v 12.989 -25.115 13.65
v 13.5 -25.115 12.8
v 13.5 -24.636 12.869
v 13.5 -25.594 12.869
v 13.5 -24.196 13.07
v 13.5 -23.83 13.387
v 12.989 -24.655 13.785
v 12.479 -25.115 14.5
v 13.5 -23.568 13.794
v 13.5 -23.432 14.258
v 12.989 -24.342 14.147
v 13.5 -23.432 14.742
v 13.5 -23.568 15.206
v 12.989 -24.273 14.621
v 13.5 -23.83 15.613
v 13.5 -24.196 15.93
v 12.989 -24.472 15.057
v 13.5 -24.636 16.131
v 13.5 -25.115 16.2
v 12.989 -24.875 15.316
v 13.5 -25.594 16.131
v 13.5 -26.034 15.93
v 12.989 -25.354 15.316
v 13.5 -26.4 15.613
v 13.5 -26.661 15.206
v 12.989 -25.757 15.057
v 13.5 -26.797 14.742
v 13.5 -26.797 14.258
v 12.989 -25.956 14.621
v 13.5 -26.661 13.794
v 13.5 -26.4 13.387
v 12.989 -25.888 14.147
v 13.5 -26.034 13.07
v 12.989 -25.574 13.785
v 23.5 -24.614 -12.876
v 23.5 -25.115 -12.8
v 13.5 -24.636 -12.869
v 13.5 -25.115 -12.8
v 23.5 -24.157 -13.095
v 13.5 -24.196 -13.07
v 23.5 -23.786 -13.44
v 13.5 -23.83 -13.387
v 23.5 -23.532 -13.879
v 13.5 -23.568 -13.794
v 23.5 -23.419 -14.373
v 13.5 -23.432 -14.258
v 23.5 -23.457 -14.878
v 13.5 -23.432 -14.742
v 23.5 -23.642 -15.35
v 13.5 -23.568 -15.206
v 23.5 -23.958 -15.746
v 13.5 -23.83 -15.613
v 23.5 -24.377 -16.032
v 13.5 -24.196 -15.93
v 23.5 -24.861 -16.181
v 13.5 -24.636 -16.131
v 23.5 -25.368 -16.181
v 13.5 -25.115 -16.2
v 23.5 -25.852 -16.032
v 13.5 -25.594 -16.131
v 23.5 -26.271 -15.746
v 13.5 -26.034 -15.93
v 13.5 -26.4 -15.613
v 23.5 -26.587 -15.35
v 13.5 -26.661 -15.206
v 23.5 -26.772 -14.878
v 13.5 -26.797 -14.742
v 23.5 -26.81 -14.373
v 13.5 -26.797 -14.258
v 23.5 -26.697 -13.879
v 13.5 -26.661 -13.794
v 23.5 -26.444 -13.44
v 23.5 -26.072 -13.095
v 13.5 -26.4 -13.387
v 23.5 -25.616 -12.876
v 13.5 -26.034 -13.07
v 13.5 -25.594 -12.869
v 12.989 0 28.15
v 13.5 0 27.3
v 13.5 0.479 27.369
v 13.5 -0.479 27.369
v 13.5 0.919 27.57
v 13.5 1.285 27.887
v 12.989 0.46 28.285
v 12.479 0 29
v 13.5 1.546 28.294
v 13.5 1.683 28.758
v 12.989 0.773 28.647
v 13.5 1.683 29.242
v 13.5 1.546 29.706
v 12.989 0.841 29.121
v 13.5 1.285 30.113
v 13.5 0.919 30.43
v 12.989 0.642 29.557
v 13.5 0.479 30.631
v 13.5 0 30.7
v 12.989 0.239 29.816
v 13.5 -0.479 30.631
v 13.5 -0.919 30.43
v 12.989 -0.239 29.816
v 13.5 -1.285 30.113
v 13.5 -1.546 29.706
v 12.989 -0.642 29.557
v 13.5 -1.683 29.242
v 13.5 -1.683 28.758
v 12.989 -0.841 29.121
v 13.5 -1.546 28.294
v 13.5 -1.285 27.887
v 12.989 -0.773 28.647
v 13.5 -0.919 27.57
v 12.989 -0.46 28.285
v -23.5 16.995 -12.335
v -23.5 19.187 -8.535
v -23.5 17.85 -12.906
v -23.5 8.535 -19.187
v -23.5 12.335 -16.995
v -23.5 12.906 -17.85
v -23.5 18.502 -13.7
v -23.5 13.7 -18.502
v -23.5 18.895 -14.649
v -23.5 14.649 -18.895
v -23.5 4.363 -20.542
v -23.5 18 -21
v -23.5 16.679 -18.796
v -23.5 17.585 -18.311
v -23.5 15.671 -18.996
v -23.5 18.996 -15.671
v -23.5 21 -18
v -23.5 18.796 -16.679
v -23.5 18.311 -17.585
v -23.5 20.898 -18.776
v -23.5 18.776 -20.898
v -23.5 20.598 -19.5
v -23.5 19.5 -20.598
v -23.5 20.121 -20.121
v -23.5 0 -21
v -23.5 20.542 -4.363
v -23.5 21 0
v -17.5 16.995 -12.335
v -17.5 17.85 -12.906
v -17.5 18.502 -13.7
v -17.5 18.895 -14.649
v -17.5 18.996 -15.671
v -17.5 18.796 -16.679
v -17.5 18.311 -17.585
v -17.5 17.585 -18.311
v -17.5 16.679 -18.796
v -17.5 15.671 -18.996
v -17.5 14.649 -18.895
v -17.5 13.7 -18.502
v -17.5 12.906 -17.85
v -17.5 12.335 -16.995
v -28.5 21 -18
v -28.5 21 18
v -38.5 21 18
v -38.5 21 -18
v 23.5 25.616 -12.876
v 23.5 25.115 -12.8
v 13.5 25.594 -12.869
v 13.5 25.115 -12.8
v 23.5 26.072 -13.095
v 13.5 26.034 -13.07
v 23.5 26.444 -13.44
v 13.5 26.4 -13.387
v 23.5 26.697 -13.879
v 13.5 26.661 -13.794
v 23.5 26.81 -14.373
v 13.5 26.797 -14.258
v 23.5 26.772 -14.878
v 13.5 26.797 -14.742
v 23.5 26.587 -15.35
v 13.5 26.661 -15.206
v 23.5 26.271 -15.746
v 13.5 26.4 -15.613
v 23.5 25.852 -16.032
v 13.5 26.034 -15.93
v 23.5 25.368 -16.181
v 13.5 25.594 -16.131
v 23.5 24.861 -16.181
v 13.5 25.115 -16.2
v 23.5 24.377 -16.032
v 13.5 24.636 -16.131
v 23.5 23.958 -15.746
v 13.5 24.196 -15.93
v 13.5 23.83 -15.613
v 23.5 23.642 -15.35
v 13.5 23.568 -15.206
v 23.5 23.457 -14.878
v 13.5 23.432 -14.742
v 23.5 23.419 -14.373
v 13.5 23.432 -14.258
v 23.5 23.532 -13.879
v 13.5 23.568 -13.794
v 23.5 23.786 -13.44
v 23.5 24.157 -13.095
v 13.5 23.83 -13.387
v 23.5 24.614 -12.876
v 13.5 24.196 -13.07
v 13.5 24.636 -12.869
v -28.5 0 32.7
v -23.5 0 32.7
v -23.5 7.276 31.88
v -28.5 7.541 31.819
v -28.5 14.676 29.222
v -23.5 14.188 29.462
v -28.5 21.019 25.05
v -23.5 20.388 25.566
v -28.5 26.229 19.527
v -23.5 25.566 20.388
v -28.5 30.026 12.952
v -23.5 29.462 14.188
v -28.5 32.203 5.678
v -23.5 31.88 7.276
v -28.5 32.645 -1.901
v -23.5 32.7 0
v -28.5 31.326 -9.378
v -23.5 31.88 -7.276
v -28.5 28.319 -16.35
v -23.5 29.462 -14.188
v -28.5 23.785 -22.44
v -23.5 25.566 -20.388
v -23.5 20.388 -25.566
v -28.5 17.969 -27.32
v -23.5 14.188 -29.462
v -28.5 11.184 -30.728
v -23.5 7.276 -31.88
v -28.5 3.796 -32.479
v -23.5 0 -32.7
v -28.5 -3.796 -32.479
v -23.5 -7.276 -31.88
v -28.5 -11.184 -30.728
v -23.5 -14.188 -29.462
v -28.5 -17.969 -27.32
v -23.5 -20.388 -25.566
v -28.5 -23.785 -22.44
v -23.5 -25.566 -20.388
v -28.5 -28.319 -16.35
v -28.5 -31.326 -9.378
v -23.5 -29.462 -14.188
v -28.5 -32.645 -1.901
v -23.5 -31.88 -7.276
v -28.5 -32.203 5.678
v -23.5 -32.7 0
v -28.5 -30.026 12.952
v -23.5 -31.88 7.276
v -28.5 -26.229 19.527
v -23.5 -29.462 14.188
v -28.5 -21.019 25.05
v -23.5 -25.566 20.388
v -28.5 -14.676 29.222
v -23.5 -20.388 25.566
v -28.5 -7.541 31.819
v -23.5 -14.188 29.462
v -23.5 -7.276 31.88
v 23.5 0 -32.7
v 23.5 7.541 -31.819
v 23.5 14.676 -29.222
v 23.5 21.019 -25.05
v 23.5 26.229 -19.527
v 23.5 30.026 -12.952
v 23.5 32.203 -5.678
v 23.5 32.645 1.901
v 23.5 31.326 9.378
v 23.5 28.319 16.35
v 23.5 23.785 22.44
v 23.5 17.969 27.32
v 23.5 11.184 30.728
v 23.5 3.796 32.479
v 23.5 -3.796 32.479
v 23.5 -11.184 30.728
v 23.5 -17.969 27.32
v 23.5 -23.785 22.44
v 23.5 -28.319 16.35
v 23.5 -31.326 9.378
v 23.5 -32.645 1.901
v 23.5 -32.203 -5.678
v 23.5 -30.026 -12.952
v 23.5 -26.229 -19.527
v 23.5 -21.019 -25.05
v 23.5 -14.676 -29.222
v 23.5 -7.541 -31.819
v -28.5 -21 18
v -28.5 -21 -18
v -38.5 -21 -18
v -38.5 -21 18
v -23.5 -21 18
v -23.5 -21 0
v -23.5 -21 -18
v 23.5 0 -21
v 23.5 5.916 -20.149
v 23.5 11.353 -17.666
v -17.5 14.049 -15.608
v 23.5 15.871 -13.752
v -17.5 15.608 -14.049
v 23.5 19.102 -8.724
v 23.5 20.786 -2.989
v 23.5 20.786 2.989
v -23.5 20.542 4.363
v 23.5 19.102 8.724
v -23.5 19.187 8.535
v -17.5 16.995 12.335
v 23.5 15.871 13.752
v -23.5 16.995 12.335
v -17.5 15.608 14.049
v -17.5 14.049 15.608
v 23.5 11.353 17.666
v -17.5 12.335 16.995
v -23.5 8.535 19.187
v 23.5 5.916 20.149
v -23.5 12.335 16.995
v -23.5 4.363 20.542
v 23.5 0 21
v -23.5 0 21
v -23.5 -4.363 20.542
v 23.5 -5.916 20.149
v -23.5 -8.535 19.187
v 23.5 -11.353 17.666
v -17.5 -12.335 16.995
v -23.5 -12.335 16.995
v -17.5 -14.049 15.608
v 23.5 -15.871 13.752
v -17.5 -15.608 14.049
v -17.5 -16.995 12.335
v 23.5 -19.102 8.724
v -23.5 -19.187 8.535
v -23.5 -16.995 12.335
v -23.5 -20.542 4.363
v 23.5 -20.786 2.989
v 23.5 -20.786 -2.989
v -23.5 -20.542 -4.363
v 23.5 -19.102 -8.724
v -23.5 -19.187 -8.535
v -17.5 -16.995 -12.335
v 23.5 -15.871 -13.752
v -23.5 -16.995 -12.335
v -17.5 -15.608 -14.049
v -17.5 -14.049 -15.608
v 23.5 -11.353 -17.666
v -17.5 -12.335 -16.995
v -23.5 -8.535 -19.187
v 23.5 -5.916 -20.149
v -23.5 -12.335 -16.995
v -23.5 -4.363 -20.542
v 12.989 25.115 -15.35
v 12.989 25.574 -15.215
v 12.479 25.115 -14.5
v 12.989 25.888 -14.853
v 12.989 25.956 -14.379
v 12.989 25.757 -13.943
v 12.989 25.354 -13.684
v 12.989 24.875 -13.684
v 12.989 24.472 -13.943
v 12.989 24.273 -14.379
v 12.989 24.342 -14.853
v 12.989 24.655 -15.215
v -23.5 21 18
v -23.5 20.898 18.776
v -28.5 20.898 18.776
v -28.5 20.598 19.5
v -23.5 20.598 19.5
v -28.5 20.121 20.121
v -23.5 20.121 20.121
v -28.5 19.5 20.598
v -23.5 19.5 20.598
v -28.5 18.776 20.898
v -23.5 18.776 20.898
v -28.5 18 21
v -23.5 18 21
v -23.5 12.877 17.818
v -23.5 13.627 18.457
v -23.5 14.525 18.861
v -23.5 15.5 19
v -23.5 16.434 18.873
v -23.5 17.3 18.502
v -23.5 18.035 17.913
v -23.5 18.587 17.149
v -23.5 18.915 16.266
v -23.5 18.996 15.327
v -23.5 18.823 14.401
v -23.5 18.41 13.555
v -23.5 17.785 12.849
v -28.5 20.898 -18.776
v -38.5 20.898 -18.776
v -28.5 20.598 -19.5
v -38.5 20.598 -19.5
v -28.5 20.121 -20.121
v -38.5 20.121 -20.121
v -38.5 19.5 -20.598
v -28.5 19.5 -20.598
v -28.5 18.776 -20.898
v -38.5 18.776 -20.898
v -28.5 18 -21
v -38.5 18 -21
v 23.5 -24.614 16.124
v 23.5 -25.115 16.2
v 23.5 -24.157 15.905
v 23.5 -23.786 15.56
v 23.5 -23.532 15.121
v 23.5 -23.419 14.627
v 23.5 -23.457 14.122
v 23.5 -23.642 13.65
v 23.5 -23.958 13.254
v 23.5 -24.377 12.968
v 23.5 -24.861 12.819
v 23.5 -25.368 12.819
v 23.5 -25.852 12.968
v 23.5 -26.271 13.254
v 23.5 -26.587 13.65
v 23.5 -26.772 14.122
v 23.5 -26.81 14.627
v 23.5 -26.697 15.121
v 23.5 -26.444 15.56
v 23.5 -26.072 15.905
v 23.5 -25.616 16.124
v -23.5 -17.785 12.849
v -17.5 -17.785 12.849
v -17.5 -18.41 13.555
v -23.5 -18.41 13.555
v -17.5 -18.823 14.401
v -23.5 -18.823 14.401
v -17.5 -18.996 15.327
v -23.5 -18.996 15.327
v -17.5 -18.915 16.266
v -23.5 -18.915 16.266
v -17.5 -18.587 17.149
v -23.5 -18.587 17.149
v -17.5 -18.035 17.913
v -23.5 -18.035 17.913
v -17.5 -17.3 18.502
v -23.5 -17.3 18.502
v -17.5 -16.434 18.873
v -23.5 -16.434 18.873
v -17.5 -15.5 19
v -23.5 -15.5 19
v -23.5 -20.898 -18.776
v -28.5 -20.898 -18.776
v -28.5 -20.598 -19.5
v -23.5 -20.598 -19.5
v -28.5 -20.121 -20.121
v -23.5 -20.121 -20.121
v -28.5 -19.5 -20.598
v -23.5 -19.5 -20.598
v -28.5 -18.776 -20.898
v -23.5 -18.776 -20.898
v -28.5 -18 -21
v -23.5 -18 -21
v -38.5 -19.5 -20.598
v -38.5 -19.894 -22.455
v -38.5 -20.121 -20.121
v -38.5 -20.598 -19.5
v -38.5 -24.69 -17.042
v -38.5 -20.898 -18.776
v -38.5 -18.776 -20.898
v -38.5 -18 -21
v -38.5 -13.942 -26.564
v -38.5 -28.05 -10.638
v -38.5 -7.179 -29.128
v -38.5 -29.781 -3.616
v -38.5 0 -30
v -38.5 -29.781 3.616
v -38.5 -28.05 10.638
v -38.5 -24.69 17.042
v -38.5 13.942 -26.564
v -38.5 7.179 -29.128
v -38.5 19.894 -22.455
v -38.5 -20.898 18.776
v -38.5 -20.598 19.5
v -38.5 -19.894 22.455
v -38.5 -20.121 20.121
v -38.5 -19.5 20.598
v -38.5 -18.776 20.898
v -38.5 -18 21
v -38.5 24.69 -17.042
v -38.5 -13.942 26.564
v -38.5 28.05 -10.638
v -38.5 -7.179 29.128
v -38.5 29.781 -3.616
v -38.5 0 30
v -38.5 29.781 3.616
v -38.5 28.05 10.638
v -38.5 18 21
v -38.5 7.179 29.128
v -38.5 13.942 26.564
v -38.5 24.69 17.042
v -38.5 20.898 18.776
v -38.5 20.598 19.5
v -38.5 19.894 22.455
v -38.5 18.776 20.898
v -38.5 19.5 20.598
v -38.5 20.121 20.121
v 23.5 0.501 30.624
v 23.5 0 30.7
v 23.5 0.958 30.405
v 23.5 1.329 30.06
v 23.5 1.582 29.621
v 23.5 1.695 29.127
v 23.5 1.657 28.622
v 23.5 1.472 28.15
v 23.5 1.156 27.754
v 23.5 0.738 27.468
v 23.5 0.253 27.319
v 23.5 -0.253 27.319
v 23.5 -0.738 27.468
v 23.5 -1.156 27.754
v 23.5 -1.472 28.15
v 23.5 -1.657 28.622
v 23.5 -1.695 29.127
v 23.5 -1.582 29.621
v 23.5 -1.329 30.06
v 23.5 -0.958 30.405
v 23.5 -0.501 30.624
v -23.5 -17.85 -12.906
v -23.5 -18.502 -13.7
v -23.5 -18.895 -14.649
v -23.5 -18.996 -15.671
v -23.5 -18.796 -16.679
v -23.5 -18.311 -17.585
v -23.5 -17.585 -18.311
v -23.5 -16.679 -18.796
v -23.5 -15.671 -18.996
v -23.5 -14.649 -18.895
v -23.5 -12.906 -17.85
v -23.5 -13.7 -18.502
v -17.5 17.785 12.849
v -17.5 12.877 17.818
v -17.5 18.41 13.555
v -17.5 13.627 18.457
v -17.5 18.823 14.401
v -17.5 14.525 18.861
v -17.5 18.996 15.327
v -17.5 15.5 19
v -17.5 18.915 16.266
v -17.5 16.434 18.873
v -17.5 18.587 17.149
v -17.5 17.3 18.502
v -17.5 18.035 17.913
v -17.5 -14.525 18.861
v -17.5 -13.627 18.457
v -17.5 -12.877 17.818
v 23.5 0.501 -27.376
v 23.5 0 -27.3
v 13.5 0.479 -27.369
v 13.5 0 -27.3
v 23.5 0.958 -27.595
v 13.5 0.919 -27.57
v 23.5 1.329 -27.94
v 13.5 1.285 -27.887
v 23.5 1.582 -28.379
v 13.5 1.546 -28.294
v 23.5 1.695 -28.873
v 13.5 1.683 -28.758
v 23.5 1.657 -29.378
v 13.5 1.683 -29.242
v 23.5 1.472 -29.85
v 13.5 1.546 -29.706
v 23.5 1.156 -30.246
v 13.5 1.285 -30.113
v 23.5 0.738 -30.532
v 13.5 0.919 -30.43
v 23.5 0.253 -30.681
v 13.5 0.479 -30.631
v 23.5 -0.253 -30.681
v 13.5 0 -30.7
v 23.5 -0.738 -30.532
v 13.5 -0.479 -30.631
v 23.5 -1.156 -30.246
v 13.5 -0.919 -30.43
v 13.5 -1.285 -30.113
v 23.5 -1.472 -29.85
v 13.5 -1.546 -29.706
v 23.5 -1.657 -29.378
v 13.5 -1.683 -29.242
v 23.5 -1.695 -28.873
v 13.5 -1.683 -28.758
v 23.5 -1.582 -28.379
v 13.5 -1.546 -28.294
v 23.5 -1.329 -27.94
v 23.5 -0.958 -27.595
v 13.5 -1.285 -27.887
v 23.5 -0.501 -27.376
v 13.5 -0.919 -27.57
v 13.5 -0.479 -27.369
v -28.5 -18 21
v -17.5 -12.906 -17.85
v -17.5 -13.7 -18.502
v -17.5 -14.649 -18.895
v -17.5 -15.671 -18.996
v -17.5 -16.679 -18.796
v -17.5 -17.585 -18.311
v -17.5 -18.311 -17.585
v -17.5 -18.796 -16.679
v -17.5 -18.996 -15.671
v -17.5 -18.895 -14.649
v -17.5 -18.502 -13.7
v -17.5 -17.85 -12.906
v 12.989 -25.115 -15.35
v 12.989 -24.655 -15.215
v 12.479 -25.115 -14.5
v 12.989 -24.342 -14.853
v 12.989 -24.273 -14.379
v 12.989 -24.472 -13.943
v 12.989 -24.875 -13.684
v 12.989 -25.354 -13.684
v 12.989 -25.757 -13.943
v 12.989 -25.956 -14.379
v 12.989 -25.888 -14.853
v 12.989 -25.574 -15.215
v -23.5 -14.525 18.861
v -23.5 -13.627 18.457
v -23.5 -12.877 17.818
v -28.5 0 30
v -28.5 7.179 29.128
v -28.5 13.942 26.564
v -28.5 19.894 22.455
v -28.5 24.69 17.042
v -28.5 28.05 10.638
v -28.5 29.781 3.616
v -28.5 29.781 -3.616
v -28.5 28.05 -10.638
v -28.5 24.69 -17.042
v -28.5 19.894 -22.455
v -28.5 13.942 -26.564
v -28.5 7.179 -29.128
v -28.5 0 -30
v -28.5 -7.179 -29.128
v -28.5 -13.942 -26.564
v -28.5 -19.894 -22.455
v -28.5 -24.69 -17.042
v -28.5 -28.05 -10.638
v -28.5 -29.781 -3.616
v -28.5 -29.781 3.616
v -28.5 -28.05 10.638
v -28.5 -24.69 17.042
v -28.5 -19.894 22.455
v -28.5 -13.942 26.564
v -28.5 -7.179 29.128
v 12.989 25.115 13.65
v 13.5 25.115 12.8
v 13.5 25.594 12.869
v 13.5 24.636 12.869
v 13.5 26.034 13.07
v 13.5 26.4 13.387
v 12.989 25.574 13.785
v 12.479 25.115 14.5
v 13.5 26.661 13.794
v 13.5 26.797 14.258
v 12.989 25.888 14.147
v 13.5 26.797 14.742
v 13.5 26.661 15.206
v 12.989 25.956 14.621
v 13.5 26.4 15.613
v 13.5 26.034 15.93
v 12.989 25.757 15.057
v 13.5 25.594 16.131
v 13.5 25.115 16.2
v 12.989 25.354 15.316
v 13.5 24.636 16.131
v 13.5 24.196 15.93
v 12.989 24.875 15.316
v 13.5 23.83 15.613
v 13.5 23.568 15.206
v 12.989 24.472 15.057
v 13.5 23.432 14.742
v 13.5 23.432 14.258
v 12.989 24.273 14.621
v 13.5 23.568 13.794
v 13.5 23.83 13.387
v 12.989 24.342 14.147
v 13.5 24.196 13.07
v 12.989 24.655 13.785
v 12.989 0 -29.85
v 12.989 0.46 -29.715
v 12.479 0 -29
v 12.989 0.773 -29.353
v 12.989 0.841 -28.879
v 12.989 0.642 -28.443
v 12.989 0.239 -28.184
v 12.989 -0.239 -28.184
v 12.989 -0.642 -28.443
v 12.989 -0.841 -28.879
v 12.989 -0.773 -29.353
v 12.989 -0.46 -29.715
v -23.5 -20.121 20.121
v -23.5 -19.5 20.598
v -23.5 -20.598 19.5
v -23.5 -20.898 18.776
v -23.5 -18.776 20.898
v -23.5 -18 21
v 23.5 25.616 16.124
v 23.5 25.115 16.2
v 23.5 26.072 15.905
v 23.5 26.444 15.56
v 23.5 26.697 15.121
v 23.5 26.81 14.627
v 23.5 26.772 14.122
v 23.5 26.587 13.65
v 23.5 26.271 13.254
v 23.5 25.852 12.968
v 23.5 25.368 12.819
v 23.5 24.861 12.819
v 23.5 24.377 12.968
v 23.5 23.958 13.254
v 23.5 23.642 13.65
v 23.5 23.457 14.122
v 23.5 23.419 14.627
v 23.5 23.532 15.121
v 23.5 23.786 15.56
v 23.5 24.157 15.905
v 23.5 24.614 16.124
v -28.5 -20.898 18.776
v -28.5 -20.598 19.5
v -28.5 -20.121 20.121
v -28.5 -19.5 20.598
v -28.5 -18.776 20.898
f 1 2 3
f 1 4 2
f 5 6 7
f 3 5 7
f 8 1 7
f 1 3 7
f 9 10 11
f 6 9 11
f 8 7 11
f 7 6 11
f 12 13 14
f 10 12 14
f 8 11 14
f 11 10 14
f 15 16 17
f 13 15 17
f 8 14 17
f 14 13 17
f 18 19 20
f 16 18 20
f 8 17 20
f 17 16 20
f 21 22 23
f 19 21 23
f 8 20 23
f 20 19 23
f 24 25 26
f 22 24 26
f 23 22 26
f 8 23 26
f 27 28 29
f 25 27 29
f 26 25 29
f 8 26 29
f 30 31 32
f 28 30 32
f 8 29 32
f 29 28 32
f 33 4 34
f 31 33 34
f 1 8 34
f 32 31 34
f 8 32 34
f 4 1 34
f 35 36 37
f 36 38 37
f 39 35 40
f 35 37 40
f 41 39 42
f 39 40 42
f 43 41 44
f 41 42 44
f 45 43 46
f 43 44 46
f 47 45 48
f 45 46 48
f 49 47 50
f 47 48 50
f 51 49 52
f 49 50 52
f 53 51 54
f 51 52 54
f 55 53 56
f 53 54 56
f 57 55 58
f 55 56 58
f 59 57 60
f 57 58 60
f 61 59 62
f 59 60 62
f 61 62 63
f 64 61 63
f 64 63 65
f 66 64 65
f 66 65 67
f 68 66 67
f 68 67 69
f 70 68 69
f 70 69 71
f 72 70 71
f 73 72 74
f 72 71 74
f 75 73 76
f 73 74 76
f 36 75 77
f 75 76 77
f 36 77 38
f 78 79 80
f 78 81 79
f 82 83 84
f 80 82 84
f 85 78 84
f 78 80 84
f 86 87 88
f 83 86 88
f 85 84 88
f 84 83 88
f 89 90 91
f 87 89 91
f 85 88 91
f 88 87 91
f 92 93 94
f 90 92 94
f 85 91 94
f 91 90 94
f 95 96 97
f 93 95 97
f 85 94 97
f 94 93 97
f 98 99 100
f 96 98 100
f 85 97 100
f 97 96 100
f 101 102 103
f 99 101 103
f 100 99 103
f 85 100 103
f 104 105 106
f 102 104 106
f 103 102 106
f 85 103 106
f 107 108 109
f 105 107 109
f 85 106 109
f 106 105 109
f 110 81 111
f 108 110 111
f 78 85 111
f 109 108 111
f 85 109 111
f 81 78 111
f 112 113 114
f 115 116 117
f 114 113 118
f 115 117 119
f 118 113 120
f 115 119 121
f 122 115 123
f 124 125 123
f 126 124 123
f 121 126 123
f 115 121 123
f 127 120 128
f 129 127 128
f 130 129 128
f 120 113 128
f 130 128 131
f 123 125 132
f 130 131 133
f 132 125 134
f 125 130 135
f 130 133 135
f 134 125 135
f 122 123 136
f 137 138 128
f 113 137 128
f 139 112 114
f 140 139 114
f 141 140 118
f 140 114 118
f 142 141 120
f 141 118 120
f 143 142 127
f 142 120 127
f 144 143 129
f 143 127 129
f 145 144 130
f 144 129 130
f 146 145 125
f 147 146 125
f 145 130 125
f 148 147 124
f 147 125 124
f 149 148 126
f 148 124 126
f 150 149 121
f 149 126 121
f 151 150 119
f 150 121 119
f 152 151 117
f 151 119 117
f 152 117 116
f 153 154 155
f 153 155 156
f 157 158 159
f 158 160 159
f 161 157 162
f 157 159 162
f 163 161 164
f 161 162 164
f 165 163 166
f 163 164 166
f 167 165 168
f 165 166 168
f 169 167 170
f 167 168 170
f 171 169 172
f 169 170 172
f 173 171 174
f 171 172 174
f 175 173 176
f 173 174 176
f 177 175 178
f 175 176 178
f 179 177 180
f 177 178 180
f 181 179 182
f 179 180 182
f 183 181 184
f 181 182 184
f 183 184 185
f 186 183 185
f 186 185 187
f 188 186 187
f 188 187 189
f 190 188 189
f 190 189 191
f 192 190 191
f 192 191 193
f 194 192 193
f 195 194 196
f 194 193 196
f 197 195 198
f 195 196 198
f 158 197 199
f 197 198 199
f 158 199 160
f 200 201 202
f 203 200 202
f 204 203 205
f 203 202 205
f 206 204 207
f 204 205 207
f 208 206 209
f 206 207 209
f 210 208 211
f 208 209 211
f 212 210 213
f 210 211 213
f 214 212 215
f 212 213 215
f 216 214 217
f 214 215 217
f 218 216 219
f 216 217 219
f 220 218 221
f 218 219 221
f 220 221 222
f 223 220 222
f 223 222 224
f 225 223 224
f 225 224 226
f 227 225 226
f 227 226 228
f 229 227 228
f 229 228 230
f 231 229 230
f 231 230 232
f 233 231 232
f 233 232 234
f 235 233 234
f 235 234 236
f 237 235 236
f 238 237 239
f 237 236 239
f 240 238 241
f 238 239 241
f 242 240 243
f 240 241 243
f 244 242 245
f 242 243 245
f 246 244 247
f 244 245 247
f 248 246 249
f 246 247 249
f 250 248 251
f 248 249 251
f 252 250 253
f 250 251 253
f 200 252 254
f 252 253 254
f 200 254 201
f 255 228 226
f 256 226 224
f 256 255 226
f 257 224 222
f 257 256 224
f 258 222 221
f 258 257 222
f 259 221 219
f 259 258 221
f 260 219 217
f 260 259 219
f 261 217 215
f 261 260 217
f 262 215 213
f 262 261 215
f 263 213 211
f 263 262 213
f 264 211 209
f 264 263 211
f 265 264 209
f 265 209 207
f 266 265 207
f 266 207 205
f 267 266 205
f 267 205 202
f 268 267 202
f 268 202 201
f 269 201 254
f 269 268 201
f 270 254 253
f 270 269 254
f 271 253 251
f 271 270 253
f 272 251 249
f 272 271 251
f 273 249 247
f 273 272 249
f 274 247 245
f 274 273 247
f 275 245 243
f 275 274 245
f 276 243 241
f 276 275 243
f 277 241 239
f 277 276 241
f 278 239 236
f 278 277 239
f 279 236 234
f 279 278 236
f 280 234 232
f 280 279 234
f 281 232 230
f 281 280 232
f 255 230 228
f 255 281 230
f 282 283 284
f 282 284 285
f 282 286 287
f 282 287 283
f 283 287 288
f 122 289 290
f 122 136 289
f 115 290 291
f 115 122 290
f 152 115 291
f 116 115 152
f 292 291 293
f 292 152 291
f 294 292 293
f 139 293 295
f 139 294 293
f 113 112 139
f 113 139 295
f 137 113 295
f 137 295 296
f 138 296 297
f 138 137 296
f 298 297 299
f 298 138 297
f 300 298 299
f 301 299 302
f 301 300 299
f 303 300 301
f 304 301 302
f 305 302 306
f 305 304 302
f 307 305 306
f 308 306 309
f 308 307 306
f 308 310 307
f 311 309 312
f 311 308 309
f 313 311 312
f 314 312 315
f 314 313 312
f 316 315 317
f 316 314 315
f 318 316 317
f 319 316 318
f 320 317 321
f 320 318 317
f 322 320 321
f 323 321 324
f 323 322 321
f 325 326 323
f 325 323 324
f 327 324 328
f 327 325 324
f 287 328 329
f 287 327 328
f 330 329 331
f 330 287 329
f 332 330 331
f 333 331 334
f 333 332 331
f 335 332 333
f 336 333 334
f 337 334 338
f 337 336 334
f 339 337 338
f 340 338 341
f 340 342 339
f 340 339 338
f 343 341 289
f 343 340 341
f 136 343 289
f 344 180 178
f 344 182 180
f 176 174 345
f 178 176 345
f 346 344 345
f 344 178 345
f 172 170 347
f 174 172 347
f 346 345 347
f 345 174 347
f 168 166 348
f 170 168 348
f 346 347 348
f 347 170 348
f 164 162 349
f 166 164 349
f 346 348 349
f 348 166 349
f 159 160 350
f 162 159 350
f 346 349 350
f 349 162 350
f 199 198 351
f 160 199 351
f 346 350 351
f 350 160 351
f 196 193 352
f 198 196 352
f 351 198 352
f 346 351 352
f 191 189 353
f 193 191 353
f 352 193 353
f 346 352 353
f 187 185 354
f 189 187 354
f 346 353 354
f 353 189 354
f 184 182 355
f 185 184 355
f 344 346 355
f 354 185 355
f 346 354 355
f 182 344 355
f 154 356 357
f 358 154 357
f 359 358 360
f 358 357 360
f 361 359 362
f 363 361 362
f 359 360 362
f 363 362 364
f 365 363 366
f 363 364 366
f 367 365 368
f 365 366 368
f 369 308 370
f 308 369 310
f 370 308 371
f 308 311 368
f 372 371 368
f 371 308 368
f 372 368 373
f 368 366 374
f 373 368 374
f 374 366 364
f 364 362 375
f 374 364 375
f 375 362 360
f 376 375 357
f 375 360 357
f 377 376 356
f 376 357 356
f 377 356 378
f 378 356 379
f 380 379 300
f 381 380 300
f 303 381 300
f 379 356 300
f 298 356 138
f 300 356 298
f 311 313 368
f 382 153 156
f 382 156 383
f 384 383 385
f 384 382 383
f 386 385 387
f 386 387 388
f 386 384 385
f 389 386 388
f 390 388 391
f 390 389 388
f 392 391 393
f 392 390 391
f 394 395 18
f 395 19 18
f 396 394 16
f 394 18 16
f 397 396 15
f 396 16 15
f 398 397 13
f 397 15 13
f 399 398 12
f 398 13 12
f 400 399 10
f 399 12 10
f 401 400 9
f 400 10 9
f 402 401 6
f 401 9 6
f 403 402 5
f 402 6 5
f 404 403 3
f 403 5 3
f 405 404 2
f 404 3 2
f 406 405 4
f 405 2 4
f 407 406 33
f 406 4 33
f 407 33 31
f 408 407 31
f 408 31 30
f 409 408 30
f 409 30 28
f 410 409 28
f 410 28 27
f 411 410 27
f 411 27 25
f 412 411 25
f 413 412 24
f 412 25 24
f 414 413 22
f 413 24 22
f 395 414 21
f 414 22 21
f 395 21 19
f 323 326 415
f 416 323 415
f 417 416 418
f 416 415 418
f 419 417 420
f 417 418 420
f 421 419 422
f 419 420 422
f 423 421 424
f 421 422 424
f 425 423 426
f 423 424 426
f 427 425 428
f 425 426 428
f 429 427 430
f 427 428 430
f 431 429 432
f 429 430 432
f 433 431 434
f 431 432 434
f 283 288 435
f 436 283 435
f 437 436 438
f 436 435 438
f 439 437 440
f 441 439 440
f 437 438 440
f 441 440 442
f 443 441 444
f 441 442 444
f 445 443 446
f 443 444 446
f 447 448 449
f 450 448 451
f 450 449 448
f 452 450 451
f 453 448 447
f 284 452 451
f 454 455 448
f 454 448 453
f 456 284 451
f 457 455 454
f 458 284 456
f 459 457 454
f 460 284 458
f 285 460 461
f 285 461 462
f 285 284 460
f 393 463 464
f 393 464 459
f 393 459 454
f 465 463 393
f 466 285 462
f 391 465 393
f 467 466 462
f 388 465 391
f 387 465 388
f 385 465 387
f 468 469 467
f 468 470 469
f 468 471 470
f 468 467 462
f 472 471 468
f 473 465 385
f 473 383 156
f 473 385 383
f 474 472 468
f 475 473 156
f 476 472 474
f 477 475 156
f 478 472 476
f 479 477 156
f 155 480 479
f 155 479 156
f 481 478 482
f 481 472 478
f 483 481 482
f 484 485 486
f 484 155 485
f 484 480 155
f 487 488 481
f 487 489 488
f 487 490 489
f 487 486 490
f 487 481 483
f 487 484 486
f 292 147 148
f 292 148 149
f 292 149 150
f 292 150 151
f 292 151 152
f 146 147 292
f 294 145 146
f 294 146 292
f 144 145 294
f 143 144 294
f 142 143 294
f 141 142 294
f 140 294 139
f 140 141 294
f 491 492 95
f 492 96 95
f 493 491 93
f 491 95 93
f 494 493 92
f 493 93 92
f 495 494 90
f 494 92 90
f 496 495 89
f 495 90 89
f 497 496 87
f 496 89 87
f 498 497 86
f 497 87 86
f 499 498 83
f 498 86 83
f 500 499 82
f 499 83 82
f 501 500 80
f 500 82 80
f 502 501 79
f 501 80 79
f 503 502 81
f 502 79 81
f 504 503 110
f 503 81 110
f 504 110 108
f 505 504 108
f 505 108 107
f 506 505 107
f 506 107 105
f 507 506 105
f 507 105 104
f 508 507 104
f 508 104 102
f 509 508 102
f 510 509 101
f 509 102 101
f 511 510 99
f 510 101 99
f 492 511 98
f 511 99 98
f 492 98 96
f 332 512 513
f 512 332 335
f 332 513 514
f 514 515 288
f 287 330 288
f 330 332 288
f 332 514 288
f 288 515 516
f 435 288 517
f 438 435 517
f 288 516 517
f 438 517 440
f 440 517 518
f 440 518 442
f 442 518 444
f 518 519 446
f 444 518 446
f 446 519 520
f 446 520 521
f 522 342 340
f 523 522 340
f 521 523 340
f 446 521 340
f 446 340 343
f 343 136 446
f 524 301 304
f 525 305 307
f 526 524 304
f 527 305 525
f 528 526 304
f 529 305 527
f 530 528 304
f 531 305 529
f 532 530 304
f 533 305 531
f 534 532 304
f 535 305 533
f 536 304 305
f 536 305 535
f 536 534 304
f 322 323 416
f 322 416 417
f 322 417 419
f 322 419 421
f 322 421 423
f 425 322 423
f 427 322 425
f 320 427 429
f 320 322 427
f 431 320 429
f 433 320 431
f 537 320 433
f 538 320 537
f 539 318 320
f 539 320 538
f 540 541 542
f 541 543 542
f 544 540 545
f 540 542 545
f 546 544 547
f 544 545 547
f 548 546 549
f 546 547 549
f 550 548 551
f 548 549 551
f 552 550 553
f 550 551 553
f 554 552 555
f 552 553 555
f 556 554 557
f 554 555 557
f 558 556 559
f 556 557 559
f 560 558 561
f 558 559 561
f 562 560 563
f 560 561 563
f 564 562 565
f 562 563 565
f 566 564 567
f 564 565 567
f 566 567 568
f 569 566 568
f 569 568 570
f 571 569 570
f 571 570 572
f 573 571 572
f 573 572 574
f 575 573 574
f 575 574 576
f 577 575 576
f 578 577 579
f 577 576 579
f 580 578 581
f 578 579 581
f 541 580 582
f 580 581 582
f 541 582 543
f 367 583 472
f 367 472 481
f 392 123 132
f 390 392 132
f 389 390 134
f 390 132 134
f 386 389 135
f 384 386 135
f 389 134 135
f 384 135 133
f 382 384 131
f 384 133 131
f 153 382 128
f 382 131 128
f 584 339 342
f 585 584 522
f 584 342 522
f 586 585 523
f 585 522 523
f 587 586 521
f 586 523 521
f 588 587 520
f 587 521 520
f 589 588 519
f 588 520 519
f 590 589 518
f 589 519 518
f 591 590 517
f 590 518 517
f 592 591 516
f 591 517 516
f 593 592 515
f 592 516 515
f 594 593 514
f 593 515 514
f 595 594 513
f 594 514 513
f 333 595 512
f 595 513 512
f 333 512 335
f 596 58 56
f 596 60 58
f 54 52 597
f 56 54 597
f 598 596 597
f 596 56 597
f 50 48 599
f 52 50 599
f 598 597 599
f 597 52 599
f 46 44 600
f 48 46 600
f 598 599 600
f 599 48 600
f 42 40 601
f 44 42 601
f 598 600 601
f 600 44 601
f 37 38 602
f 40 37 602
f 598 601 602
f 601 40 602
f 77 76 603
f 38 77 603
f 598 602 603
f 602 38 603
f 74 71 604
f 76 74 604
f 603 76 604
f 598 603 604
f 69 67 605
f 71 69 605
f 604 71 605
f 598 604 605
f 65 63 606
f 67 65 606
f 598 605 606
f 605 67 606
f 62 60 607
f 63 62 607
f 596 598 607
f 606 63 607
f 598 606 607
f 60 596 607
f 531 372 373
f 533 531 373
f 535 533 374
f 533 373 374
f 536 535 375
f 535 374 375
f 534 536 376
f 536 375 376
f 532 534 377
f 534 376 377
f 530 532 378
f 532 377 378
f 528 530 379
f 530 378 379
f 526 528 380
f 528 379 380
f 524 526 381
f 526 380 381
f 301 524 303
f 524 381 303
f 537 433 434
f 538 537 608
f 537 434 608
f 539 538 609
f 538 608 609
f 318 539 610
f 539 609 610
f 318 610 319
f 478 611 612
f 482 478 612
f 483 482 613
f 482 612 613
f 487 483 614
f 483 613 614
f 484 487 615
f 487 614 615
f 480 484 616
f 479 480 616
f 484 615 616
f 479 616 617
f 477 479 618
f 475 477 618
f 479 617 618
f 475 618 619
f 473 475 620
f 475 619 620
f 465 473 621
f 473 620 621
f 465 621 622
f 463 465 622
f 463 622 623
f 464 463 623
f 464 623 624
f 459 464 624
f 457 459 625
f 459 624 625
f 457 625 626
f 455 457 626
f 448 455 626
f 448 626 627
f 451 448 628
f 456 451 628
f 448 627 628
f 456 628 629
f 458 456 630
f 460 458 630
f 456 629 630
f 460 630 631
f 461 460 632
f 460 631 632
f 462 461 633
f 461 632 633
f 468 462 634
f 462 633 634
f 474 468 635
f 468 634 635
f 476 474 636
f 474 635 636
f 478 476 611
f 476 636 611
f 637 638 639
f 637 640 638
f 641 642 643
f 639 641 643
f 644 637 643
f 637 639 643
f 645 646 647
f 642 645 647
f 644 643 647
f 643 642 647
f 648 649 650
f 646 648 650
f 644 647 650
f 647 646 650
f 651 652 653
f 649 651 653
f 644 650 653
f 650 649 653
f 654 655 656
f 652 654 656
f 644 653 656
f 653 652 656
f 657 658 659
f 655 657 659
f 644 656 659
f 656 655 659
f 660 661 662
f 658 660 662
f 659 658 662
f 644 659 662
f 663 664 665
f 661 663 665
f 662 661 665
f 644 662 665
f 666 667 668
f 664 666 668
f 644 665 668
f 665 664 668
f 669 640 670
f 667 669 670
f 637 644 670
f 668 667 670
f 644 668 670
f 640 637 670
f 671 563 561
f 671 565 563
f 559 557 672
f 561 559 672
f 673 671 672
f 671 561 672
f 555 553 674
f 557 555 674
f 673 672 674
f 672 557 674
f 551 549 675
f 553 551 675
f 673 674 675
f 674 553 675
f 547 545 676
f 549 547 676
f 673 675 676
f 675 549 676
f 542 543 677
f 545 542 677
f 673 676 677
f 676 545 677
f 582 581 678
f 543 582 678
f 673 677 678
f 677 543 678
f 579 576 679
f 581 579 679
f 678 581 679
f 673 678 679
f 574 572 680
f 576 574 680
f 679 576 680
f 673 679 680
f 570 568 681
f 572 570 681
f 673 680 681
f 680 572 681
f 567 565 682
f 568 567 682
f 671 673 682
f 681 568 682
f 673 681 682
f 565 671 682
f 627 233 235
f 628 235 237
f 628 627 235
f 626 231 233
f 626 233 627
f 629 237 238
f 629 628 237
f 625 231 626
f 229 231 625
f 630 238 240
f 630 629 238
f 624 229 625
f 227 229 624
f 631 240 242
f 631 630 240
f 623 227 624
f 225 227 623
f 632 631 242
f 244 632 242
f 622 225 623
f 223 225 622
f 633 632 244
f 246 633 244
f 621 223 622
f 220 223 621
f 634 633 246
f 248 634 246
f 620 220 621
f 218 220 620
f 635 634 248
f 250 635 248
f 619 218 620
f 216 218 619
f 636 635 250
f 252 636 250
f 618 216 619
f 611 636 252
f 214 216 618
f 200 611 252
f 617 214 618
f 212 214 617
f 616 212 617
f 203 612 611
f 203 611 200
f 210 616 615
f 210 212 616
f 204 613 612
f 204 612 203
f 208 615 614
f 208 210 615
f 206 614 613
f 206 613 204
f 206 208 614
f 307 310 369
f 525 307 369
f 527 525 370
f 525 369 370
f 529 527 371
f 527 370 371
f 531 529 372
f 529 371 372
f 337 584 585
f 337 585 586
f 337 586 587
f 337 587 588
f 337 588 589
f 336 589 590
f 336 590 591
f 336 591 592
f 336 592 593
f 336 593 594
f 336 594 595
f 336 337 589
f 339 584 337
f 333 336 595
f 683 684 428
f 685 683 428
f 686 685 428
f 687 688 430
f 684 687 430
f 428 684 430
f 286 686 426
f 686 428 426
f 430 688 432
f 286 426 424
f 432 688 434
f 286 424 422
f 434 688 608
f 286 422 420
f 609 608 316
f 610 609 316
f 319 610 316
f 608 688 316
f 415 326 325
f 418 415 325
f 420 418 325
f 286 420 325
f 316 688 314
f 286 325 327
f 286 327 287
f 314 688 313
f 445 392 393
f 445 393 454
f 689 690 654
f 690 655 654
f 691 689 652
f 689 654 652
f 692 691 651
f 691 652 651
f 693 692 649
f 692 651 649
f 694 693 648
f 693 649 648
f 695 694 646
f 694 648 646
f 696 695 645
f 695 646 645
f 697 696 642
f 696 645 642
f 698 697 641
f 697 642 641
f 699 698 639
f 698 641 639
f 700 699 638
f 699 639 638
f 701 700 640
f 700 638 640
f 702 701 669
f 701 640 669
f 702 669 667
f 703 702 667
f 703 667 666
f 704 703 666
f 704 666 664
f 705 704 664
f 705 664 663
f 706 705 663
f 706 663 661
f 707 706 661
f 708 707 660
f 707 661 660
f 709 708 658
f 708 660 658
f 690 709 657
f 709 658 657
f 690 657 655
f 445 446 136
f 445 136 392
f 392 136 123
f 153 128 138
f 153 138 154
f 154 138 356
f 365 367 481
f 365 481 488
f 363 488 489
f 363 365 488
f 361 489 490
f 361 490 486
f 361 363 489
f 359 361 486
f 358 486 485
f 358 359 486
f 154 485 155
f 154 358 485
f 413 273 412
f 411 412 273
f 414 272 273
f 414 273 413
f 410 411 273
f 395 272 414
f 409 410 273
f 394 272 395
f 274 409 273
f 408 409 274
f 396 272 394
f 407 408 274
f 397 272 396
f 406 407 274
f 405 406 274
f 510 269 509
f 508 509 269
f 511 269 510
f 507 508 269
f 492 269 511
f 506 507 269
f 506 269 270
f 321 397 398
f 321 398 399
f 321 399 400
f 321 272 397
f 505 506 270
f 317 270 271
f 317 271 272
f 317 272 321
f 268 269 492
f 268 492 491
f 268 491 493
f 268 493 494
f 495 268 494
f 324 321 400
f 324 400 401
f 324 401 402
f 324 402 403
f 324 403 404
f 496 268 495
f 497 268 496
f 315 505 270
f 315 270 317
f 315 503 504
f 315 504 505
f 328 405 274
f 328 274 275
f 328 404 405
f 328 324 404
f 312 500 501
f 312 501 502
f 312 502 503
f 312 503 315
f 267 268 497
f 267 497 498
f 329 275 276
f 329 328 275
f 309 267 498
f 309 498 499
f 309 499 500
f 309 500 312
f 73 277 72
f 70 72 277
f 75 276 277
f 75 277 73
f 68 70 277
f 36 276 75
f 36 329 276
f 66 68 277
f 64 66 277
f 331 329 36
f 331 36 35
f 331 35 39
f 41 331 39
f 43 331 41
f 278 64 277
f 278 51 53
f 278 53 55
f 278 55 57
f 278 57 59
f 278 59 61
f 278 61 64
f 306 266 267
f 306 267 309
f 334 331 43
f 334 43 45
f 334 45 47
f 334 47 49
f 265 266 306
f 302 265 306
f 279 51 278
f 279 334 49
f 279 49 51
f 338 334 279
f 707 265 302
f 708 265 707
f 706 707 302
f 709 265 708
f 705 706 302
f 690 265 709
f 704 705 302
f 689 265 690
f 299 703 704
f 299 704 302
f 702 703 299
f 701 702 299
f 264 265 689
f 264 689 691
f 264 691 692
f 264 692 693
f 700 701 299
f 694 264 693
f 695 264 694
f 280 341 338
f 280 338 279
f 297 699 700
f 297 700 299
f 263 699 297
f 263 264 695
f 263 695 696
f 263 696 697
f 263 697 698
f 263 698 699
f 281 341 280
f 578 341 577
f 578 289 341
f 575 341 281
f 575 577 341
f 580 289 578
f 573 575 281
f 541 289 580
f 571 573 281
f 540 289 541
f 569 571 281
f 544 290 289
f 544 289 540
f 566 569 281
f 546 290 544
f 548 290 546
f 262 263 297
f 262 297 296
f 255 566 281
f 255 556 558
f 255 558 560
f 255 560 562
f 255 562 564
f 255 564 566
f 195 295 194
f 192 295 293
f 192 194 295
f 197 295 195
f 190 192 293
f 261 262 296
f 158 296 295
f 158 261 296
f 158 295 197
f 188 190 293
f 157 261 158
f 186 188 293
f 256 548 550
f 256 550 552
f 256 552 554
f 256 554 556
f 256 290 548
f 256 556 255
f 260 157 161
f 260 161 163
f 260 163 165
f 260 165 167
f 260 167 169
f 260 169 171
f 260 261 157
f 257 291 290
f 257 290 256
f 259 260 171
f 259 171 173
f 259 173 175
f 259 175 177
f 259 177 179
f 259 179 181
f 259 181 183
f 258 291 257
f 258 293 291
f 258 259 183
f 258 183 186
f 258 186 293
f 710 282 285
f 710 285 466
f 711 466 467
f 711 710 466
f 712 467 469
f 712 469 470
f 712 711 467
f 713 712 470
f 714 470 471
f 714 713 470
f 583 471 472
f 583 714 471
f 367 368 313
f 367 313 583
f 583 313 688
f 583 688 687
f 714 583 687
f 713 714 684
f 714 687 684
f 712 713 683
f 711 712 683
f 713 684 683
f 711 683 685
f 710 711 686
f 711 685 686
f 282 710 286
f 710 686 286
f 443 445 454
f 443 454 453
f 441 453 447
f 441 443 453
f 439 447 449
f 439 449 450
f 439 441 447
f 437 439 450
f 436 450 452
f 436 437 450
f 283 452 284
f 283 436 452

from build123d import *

# Parameters (mm, degrees)
CROQUIS1_R                       = 32.7
CROQUIS1_R_2                     = 21
SALIENTE_EXTRUIR1_DEPTH          = 23.5
CROQUIS3_R                       = 32.7
SALIENTE_EXTRUIR3_DEPTH          = 5
CROQUIS4_R                       = 3.5
CORTAR_EXTRUIR1_DEPTH            = 6
CROQUIS21_R                      = 30
SALIENTE_EXTRUIR4_DEPTH          = 10
TALADRO_DE_MARGEN_PARA_M31_D     = 3.4
TALADRO_DE_MARGEN_PARA_M31_DEPTH = 10
TALADRO_DE_MARGEN_PARA_M31_TIP   = 1.021463052


with BuildPart() as part:
    # Croquis1 → Saliente-Extruir1 (new, symmetric)
    with BuildSketch(Plane(origin=(0, 0, 0), x_dir=(0, 0, -1), z_dir=(1, 0, 0))):
        Circle(CROQUIS1_R)
        Circle(CROQUIS1_R_2, mode=Mode.SUBTRACT)
    extrude(amount=SALIENTE_EXTRUIR1_DEPTH, both=True)

    # Croquis3 → Saliente-Extruir3 (add)
    with BuildSketch(Plane.ZY.offset(23.5)):
        Circle(CROQUIS3_R)
        with BuildLine():
            Line((-18, 21), (18, 21))
            ThreePointArc((18, 21), (20.121320344, 20.121320344), (21, 18))
            Line((21, 18), (21, -18))
            ThreePointArc((21, -18), (20.121320344, -20.121320344), (18, -21))
            Line((18, -21), (-18, -21))
            ThreePointArc((-18, -21), (-20.121320344, -20.121320344), (-21, -18))
            Line((-21, -18), (-21, 18))
            ThreePointArc((-21, 18), (-20.121320344, 20.121320344), (-18, 21))
        make_face(mode=Mode.SUBTRACT)
    extrude(amount=SALIENTE_EXTRUIR3_DEPTH)

    # Croquis4 → Cortar-Extruir1 (cut)
    with BuildSketch(Plane.ZY.offset(23.5)):
        with Locations((15.5, 15.5)):
            Circle(CROQUIS4_R)
        with Locations((-15.5, 15.5)):
            Circle(CROQUIS4_R)
        with Locations((-15.5, -15.5)):
            Circle(CROQUIS4_R)
        with Locations((15.5, -15.5)):
            Circle(CROQUIS4_R)
    extrude(amount=-CORTAR_EXTRUIR1_DEPTH, mode=Mode.SUBTRACT)

    # Croquis21 → Saliente-Extruir4 (add)
    with BuildSketch(Plane.ZY.offset(28.5)):
        Circle(CROQUIS21_R)
        with BuildLine():
            Line((18, 21), (0, 21))
            Line((0, 21), (-18, 21))
            ThreePointArc((-18, 21), (-20.121320344, 20.121320344), (-21, 18))
            Line((-21, 18), (-21, 0))
            Line((-21, 0), (-21, -18))
            ThreePointArc((-21, -18), (-20.121320344, -20.121320344), (-18, -21))
            Line((-18, -21), (0, -21))
            Line((0, -21), (18, -21))
            ThreePointArc((18, -21), (20.121320344, -20.121320344), (21, -18))
            Line((21, -18), (21, 0))
            Line((21, 0), (21, 18))
            ThreePointArc((21, 18), (20.121320344, 20.121320344), (18, 21))
        make_face(mode=Mode.SUBTRACT)
    extrude(amount=SALIENTE_EXTRUIR4_DEPTH)

    # Taladro de margen para M31
    with Locations(Plane(origin=(23.5, 0, 0), x_dir=(0, 0, -1), z_dir=(1, 0, 0))):
        with Locations((29, 0), (14.5, -25.11473671), (-14.5, -25.11473671), (-29, 0), (-14.5, 25.11473671), (14.5, 25.11473671)):
            Hole(TALADRO_DE_MARGEN_PARA_M31_D / 2, depth=TALADRO_DE_MARGEN_PARA_M31_DEPTH)
            with Locations((0, 0, -(TALADRO_DE_MARGEN_PARA_M31_DEPTH + TALADRO_DE_MARGEN_PARA_M31_TIP / 2))):  # 118° drill point
                Cone(0, TALADRO_DE_MARGEN_PARA_M31_D / 2, TALADRO_DE_MARGEN_PARA_M31_TIP, mode=Mode.SUBTRACT)


solid = part.part
